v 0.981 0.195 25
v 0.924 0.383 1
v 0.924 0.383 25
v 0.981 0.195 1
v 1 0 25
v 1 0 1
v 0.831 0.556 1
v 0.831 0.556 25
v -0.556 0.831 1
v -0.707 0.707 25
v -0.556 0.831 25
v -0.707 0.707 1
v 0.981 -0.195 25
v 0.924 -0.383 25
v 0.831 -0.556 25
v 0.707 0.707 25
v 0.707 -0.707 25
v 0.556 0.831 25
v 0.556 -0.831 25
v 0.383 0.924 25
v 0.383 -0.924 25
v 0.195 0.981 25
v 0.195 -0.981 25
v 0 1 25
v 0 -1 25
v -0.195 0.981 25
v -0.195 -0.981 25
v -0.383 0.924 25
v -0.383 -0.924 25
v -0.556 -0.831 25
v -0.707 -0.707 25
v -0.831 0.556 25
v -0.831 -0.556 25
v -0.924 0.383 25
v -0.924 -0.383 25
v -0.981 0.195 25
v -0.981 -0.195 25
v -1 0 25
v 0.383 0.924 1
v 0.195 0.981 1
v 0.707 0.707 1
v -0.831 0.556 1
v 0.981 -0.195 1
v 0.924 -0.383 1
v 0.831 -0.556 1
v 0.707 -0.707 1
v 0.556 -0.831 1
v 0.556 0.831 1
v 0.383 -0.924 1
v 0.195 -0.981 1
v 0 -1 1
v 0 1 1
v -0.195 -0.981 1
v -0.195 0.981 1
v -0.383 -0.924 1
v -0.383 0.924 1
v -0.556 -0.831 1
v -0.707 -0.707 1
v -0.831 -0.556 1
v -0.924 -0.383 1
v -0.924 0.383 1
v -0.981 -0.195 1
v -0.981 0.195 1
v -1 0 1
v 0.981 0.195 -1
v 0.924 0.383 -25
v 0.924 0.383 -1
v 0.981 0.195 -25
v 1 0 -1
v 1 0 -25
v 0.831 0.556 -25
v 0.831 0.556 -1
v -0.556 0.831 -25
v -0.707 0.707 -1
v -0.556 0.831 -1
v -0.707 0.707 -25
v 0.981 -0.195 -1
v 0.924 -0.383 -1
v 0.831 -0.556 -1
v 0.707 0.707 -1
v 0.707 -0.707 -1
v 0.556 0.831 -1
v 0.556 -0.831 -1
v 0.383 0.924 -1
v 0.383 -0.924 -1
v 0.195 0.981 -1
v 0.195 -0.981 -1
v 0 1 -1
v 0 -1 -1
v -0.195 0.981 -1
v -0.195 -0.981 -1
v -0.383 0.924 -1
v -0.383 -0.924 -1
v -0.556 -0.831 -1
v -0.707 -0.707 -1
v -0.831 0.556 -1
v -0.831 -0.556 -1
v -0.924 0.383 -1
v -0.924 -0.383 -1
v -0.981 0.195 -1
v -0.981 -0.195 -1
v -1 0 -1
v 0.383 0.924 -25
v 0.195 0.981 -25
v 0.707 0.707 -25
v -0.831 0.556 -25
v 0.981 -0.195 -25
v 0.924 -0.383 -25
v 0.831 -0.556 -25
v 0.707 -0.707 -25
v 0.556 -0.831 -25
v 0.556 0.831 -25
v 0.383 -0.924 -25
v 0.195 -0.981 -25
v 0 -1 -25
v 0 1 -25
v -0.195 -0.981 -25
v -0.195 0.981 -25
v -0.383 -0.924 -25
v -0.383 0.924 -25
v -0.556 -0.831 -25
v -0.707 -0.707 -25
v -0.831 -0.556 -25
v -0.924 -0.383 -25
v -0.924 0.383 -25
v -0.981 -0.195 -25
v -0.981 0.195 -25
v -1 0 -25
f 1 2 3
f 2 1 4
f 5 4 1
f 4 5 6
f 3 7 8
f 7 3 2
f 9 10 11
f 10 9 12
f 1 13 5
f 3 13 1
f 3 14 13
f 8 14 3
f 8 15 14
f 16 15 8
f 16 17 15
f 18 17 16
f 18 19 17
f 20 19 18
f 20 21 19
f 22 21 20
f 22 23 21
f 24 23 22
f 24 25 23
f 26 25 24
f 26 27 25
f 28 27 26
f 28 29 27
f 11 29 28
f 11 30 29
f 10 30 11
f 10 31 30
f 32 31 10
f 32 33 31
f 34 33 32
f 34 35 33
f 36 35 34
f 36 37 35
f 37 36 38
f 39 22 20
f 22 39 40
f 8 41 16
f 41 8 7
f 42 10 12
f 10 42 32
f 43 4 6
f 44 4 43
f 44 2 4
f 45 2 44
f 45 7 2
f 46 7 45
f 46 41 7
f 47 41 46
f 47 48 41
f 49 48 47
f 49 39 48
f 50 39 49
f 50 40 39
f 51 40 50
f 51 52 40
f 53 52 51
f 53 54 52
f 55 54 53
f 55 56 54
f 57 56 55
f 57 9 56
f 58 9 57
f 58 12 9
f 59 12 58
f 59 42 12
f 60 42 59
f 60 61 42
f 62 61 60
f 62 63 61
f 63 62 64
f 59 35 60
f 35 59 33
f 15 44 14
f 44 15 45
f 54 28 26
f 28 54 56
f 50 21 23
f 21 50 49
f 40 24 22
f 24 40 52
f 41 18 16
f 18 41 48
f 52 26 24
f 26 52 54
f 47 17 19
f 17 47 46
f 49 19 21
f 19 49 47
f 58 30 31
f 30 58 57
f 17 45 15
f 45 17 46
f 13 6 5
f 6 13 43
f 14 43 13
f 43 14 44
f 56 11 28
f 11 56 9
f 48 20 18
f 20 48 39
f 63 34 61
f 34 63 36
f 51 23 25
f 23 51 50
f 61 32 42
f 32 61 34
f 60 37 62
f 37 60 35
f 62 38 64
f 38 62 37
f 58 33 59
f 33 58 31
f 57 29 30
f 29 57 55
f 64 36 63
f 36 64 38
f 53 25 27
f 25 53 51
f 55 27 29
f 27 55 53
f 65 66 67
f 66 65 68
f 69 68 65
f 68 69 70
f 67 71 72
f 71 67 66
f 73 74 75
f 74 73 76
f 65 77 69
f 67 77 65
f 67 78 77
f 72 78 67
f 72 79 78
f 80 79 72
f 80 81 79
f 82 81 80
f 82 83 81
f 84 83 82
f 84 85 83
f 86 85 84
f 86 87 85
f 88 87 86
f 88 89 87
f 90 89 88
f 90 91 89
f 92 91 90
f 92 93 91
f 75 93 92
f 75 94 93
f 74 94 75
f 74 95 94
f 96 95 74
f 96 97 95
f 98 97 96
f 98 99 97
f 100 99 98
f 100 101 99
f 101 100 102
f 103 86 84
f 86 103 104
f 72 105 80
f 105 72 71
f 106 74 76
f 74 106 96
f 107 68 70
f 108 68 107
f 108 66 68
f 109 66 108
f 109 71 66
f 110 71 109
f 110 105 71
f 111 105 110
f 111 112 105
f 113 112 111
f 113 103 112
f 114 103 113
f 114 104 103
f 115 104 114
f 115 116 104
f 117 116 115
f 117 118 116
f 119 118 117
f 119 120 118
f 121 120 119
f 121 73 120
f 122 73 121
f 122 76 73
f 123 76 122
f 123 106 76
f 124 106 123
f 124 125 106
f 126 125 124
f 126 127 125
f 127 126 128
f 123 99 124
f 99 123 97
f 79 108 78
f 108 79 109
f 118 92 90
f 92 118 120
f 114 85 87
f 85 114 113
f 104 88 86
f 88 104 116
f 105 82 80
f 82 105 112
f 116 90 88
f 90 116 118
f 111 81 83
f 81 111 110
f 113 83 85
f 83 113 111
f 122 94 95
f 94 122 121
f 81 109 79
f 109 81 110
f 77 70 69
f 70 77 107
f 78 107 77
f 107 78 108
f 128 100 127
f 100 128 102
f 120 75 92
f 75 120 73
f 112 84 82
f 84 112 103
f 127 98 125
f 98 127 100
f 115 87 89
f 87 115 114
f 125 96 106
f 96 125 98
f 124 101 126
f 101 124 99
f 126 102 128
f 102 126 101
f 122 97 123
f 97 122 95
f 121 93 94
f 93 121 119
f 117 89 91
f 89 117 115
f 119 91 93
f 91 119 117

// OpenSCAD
// dipole_antenna.scad

// Parameters
length = 50.0;
thickness = 2.0;

module dipole() {
    // A simple dipole geometry consisting of two cylinders with a gap in the center
    gap = 2.0;
    arm_length = (length - gap) / 2.0;

    // Arm 1
    translate([0, 0, gap/2])
        cylinder(h=arm_length, r=thickness/2, $fn=32);

    // Arm 2
    translate([0, 0, -gap/2 - arm_length])
        cylinder(h=arm_length, r=thickness/2, $fn=32);
}

// Ensure the geometry is aligned along the Z axis for standard EM port orientation
dipole();
